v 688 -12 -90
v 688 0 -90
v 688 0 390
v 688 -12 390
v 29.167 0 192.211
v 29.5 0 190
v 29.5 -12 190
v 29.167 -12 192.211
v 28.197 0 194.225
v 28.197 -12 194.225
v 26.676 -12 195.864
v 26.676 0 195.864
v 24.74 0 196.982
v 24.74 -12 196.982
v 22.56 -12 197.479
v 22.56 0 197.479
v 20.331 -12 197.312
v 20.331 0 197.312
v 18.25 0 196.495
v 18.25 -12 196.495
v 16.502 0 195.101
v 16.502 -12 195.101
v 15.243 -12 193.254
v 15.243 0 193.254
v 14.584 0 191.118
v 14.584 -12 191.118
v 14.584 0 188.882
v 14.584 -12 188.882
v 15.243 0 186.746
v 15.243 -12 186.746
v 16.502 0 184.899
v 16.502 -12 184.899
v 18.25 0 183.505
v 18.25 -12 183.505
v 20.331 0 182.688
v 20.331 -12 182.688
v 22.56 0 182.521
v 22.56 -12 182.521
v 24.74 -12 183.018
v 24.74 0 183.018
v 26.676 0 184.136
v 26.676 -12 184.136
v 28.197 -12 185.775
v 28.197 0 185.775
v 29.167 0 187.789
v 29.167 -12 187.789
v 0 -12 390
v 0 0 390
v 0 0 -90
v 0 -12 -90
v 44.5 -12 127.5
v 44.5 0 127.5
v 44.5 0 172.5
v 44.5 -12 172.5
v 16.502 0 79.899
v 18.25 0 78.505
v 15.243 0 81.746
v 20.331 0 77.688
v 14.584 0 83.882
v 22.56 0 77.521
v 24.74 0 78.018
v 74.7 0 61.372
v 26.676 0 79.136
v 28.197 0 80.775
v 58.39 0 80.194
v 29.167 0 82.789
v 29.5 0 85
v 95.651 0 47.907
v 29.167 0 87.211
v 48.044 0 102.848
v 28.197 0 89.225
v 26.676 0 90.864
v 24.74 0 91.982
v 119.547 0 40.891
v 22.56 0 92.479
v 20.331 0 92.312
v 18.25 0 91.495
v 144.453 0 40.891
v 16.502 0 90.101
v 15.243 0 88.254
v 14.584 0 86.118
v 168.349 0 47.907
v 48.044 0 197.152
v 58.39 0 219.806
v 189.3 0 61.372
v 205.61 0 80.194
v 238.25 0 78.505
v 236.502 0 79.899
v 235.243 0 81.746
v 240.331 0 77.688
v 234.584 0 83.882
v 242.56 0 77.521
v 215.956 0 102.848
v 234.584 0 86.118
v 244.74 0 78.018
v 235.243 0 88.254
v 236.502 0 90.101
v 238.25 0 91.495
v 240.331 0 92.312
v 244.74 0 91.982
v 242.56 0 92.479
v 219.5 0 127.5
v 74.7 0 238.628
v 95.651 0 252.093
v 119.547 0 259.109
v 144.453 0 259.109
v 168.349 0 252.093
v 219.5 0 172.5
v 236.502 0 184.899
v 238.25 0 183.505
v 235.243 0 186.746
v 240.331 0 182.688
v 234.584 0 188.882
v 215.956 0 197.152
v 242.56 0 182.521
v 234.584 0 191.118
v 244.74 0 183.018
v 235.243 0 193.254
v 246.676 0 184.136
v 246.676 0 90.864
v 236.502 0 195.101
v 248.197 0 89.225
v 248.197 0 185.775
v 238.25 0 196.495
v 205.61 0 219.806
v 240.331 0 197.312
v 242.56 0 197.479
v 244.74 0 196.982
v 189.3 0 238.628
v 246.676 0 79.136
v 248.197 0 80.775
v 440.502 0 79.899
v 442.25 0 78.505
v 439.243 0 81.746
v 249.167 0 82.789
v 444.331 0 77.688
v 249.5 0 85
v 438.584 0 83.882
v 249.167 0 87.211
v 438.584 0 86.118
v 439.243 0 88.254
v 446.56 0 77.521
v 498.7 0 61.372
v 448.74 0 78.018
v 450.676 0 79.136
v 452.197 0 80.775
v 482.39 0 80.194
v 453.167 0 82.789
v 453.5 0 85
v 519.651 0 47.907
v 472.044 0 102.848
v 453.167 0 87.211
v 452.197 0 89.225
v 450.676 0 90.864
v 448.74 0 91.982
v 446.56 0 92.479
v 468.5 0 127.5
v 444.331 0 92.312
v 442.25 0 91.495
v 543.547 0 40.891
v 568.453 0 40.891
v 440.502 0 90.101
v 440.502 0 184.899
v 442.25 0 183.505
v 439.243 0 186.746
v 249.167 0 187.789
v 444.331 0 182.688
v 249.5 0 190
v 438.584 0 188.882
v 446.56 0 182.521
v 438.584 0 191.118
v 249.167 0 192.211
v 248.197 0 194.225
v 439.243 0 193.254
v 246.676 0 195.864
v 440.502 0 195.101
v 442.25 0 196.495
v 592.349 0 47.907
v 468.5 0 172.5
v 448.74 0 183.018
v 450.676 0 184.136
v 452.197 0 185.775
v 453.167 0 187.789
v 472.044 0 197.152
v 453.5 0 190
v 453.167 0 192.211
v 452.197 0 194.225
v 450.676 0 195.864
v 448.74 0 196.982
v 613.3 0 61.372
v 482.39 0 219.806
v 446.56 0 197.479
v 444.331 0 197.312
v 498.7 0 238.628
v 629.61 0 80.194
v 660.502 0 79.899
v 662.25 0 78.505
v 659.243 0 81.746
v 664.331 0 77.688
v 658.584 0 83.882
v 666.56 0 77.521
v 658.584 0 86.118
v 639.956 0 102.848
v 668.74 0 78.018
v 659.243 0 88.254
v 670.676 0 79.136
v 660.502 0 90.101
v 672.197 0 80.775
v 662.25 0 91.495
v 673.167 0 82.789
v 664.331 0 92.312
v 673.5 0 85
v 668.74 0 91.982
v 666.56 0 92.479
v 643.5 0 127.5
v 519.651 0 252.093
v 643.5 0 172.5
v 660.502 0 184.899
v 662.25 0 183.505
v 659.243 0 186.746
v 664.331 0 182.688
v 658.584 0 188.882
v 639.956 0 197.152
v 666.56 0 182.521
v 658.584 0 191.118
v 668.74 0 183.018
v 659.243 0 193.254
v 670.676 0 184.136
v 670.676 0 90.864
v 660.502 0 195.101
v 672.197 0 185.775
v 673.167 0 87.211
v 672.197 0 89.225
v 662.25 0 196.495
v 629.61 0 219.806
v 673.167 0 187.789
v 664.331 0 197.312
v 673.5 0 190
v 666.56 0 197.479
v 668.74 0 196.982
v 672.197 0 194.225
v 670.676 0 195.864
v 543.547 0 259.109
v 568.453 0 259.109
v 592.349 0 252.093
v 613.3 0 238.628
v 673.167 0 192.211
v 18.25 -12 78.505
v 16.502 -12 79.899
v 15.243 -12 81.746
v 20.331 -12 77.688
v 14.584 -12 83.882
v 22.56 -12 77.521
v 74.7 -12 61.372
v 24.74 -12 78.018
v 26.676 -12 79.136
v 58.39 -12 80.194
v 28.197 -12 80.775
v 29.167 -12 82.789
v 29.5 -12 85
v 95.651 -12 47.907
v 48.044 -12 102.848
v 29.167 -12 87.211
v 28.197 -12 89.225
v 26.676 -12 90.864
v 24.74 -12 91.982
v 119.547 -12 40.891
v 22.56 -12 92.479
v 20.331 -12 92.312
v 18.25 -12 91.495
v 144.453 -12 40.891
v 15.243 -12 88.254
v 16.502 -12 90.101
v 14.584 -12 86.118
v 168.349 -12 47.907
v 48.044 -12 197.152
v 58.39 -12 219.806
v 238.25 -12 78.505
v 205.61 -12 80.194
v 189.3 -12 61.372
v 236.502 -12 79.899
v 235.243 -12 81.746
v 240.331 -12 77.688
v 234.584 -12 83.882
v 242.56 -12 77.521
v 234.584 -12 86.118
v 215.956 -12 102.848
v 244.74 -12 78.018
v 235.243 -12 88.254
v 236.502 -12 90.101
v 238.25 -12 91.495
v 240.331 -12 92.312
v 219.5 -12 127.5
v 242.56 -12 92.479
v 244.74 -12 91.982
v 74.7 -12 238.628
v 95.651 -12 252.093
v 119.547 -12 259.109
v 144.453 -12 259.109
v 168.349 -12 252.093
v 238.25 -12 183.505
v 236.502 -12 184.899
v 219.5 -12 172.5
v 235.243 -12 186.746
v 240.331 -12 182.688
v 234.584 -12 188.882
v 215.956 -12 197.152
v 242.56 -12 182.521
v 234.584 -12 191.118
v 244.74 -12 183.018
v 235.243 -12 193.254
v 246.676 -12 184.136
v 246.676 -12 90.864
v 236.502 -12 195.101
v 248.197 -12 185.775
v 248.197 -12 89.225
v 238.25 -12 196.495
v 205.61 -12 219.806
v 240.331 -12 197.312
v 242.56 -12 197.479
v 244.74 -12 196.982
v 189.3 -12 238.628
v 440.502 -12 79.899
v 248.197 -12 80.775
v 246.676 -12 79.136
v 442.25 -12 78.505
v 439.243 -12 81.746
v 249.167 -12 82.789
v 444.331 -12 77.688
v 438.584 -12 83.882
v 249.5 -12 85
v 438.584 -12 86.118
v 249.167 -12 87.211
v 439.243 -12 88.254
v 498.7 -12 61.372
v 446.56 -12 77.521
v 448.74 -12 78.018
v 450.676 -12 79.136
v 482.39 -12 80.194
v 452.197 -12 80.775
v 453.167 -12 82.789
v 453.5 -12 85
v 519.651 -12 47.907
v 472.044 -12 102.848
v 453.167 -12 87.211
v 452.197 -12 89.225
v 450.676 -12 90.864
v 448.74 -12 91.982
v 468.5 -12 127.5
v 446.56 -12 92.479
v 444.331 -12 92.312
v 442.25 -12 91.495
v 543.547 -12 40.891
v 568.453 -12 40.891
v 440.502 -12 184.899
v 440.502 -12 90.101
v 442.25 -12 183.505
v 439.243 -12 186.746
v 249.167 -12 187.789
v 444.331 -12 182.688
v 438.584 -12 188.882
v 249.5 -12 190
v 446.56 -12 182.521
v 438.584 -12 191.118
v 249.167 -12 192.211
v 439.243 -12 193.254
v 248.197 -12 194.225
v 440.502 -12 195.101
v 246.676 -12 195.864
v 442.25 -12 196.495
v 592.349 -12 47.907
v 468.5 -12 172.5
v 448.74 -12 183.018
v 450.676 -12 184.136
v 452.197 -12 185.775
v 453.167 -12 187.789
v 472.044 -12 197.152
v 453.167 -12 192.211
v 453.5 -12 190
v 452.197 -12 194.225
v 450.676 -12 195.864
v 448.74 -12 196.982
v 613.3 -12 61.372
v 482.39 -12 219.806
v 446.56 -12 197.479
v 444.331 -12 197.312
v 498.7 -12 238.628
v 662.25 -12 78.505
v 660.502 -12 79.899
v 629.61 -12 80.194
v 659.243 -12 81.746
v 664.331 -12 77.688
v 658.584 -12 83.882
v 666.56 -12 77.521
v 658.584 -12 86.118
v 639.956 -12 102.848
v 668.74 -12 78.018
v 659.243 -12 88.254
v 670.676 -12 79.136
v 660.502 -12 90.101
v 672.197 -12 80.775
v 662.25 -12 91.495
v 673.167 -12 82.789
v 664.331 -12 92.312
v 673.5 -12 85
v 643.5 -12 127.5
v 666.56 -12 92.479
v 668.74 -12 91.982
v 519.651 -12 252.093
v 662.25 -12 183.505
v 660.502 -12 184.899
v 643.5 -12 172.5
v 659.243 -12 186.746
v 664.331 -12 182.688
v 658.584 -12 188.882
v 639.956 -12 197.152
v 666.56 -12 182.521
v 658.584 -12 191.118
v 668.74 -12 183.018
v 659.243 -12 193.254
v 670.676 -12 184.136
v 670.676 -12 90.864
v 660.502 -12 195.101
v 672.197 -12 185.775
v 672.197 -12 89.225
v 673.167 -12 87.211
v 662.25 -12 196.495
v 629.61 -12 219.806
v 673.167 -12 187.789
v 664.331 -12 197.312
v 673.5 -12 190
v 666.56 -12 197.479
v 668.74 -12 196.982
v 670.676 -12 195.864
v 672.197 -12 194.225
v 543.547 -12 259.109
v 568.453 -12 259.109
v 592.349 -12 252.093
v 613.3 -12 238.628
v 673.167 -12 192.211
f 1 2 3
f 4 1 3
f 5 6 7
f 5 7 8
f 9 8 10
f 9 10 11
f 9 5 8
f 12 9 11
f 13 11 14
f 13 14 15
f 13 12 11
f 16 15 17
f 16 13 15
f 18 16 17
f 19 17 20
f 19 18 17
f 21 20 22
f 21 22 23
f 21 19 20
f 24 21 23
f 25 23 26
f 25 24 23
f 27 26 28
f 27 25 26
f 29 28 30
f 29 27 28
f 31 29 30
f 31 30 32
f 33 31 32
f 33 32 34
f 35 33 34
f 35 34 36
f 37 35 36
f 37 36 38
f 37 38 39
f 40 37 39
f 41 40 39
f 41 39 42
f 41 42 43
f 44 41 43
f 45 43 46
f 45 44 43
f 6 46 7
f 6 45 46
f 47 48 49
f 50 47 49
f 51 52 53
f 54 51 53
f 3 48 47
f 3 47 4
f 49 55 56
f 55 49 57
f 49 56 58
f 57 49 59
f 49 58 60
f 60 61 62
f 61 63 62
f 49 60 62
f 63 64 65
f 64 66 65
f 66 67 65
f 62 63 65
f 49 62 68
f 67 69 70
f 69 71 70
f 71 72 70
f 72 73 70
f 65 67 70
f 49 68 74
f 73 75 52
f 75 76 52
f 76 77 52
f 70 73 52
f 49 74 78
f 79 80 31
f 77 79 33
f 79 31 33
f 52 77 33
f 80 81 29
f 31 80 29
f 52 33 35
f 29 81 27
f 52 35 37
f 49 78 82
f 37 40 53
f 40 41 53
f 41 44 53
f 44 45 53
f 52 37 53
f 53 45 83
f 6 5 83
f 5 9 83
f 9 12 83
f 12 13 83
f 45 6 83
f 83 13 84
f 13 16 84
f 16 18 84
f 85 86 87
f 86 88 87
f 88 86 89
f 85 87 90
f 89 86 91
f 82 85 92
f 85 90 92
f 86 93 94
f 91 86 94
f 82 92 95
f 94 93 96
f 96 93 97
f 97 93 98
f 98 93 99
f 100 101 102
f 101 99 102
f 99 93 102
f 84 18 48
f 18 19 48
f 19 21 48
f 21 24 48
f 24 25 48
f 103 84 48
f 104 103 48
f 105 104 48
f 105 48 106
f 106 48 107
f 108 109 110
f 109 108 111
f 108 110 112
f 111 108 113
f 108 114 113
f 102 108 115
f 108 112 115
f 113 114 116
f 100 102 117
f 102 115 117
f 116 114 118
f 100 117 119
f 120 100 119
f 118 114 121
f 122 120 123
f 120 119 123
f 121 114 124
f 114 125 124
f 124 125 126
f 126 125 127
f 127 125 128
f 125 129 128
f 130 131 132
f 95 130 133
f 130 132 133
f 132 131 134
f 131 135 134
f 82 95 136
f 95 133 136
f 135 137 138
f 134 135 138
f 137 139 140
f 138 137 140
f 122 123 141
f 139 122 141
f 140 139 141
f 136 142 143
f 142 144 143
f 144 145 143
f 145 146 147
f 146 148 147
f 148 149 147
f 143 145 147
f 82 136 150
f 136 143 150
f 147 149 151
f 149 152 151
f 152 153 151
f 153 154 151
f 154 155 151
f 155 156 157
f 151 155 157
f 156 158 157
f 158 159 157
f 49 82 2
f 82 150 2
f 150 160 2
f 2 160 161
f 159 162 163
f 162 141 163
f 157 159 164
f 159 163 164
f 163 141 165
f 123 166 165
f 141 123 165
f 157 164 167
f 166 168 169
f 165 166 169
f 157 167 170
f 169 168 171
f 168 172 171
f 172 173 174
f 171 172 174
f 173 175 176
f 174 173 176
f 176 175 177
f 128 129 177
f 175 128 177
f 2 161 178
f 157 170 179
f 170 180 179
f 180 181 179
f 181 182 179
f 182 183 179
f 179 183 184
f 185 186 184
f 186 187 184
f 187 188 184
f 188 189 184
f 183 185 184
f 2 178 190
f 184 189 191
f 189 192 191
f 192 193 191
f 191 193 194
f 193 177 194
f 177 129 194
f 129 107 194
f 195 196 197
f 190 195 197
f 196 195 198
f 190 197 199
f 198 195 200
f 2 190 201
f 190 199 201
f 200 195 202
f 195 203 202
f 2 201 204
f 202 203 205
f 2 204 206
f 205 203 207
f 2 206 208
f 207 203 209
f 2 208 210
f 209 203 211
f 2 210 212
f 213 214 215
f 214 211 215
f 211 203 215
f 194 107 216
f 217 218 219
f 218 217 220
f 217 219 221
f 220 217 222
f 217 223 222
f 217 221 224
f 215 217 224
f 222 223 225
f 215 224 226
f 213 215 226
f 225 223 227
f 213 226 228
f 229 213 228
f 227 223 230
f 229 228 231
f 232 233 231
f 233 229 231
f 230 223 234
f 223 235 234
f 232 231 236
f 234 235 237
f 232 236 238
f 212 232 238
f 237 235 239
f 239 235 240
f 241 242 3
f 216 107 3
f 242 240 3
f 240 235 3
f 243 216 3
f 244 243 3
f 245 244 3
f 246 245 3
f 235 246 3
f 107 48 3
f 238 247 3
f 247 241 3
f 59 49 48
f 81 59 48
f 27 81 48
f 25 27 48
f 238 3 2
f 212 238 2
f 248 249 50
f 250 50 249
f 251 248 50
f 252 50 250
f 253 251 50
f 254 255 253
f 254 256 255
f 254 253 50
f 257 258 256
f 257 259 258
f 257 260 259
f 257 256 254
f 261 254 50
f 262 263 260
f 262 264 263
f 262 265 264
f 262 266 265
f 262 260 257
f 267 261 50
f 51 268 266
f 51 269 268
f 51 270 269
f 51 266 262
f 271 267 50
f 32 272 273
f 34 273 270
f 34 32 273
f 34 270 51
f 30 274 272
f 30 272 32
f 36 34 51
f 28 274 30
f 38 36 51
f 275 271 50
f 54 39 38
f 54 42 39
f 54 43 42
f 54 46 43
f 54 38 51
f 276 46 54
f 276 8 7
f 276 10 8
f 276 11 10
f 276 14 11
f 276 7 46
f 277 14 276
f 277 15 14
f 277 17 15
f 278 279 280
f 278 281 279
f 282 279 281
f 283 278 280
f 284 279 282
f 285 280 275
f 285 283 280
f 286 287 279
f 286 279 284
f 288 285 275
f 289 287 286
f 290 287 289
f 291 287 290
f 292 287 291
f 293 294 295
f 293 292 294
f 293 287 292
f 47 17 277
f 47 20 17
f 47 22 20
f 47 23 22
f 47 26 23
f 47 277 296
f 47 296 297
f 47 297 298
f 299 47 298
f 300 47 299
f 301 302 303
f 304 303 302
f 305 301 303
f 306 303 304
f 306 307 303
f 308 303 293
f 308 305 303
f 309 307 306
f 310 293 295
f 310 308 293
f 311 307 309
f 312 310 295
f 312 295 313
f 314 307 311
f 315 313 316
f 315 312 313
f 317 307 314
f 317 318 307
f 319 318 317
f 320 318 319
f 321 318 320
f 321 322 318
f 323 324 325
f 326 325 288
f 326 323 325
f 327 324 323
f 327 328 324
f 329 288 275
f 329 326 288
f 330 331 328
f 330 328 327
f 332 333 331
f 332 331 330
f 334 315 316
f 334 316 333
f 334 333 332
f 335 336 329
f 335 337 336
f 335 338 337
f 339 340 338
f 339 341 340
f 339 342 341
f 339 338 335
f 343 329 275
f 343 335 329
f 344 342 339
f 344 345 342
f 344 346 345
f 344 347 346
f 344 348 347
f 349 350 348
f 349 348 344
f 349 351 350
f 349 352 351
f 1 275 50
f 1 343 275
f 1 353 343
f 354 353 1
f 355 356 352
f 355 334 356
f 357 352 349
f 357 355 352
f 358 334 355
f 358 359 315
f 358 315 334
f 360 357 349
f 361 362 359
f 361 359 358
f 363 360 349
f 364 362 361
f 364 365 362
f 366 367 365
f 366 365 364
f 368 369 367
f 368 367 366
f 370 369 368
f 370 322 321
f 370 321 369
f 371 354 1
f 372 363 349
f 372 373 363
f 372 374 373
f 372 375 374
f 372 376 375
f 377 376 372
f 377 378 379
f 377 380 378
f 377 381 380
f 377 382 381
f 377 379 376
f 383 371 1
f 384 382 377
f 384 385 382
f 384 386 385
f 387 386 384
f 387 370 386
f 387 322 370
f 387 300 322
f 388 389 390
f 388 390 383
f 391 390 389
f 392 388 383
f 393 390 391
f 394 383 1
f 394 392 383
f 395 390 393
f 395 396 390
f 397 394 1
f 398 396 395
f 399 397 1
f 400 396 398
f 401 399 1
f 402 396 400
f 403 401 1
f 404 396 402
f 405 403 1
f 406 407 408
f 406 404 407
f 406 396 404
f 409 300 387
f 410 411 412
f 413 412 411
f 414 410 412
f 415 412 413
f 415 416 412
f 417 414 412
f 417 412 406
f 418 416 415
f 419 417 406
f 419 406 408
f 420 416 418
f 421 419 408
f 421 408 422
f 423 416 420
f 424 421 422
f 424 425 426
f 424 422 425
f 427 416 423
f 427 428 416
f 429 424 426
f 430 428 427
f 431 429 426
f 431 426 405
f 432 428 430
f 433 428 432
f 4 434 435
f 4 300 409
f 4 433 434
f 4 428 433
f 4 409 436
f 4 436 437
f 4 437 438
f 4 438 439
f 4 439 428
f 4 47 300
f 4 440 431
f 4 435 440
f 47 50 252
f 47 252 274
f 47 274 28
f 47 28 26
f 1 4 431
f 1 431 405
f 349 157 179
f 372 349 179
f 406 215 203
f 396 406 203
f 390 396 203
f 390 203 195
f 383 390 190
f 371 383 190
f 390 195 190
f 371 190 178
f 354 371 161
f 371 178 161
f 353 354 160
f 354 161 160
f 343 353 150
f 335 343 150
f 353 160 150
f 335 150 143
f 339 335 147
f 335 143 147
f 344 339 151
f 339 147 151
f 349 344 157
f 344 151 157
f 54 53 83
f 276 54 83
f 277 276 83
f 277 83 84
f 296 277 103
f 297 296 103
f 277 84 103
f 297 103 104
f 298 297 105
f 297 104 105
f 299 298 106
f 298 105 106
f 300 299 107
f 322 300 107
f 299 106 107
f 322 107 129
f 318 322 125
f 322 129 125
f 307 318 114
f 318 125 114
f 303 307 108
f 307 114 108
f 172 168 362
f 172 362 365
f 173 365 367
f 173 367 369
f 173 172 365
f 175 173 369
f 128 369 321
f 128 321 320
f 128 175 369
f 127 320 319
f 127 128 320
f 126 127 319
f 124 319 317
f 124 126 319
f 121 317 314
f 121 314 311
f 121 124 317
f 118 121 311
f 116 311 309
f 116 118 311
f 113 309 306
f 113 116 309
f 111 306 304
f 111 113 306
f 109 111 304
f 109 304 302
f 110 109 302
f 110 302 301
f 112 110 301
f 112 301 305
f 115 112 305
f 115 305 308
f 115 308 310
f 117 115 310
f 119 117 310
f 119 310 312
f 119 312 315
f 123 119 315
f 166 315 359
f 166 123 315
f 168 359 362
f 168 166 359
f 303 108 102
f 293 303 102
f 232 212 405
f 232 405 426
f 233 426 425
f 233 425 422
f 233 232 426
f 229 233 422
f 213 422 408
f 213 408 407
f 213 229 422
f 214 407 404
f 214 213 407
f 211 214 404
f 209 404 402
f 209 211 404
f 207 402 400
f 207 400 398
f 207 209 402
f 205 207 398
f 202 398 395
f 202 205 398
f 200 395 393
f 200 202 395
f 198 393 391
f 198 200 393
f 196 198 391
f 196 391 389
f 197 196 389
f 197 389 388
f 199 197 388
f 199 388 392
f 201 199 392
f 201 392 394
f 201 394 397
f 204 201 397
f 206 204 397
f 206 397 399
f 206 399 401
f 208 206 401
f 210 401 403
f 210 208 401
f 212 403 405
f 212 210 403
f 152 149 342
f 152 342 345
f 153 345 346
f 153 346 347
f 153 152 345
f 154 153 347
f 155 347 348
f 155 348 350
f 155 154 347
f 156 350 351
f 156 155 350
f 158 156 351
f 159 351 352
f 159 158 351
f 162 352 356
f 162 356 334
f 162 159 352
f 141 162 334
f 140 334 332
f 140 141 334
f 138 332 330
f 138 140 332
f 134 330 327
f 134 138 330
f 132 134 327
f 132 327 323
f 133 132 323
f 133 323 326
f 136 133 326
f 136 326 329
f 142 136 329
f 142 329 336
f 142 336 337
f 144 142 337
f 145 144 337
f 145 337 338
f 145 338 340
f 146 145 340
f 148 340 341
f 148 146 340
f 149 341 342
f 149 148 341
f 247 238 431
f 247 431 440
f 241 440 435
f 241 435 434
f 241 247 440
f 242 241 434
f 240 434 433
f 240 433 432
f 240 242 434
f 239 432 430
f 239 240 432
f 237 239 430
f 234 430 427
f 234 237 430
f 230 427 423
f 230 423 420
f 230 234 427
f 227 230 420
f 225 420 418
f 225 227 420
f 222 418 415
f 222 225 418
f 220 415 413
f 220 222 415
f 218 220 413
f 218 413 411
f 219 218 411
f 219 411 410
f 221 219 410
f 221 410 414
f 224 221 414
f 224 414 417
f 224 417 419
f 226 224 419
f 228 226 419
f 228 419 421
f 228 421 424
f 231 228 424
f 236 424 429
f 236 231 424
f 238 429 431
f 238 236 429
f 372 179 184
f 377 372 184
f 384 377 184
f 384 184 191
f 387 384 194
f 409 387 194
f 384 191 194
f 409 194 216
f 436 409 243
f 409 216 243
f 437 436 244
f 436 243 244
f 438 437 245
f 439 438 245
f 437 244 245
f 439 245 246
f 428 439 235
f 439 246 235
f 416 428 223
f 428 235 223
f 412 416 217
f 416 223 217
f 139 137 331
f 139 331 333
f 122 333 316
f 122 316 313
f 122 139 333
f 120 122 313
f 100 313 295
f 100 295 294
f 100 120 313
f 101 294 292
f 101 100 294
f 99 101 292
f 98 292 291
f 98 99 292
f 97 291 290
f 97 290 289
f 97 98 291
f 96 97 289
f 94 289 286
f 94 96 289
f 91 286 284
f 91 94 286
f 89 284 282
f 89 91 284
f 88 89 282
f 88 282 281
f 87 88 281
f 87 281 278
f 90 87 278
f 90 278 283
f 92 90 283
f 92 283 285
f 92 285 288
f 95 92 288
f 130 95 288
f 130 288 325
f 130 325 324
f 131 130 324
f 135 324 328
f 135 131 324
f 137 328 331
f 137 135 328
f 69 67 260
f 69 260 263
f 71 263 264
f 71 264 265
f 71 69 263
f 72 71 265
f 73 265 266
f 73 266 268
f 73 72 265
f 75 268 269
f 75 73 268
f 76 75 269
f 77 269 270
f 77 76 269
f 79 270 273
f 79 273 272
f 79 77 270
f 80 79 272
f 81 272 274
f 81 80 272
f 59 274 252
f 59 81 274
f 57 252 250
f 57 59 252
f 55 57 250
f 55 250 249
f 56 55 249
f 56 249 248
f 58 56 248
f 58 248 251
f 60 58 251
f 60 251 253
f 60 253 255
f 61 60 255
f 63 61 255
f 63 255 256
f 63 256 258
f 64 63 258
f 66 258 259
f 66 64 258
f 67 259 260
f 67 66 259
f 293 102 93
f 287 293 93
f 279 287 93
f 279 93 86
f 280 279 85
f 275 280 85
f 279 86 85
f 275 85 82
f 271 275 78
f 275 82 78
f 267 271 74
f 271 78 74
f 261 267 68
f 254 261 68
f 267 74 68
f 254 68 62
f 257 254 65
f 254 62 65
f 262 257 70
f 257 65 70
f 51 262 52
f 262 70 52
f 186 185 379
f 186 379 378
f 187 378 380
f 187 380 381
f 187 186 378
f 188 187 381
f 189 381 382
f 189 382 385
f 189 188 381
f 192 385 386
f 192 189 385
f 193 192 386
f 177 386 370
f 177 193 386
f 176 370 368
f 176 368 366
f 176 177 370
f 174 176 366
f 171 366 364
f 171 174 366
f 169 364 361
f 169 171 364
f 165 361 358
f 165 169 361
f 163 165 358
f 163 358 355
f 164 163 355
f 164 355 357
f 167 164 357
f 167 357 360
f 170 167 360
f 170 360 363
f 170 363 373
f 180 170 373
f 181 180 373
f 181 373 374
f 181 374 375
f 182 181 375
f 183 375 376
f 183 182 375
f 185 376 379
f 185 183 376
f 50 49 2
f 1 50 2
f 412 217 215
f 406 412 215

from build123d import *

# Parameters (mm, degrees)
F0_W     = 688
F0_H     = 90
F0_H_2   = 300
F0_R     = 7.5
F1_DEPTH = 12


with BuildPart() as f1:
    # F0 (on Front) → F1 (new body)
    with BuildSketch(Plane.XZ):
        with Locations((344, 345)):
            Rectangle(F0_W, F0_H)
        with Locations((344, 150)):
            Rectangle(F0_W, F0_H_2)
        with Locations((22, 85)):
            Circle(F0_R, mode=Mode.SUBTRACT)
        with Locations((242, 85)):
            Circle(F0_R, mode=Mode.SUBTRACT)
        with Locations((446, 85)):
            Circle(F0_R, mode=Mode.SUBTRACT)
        with Locations((666, 85)):
            Circle(F0_R, mode=Mode.SUBTRACT)
        with Locations((22, 190)):
            Circle(F0_R, mode=Mode.SUBTRACT)
        with BuildLine():
            ThreePointArc((44.5, 172.5), (132, 260), (219.5, 172.5))
            Line((219.5, 172.5), (219.5, 127.5))
            ThreePointArc((219.5, 127.5), (132, 40), (44.5, 127.5))
            Line((44.5, 127.5), (44.5, 172.5))
        make_face(mode=Mode.SUBTRACT)
        with Locations((242, 190)):
            Circle(F0_R, mode=Mode.SUBTRACT)
        with Locations((446, 190)):
            Circle(F0_R, mode=Mode.SUBTRACT)
        with BuildLine():
            ThreePointArc((468.5, 172.5), (556, 260), (643.5, 172.5))
            Line((643.5, 172.5), (643.5, 127.5))
            ThreePointArc((643.5, 127.5), (556, 40), (468.5, 127.5))
            Line((468.5, 127.5), (468.5, 172.5))
        make_face(mode=Mode.SUBTRACT)
        with Locations((666, 190)):
            Circle(F0_R, mode=Mode.SUBTRACT)
        with Locations((344, -45)):
            Rectangle(F0_W, F0_H)
    extrude(amount=F1_DEPTH)


solid = f1.part
